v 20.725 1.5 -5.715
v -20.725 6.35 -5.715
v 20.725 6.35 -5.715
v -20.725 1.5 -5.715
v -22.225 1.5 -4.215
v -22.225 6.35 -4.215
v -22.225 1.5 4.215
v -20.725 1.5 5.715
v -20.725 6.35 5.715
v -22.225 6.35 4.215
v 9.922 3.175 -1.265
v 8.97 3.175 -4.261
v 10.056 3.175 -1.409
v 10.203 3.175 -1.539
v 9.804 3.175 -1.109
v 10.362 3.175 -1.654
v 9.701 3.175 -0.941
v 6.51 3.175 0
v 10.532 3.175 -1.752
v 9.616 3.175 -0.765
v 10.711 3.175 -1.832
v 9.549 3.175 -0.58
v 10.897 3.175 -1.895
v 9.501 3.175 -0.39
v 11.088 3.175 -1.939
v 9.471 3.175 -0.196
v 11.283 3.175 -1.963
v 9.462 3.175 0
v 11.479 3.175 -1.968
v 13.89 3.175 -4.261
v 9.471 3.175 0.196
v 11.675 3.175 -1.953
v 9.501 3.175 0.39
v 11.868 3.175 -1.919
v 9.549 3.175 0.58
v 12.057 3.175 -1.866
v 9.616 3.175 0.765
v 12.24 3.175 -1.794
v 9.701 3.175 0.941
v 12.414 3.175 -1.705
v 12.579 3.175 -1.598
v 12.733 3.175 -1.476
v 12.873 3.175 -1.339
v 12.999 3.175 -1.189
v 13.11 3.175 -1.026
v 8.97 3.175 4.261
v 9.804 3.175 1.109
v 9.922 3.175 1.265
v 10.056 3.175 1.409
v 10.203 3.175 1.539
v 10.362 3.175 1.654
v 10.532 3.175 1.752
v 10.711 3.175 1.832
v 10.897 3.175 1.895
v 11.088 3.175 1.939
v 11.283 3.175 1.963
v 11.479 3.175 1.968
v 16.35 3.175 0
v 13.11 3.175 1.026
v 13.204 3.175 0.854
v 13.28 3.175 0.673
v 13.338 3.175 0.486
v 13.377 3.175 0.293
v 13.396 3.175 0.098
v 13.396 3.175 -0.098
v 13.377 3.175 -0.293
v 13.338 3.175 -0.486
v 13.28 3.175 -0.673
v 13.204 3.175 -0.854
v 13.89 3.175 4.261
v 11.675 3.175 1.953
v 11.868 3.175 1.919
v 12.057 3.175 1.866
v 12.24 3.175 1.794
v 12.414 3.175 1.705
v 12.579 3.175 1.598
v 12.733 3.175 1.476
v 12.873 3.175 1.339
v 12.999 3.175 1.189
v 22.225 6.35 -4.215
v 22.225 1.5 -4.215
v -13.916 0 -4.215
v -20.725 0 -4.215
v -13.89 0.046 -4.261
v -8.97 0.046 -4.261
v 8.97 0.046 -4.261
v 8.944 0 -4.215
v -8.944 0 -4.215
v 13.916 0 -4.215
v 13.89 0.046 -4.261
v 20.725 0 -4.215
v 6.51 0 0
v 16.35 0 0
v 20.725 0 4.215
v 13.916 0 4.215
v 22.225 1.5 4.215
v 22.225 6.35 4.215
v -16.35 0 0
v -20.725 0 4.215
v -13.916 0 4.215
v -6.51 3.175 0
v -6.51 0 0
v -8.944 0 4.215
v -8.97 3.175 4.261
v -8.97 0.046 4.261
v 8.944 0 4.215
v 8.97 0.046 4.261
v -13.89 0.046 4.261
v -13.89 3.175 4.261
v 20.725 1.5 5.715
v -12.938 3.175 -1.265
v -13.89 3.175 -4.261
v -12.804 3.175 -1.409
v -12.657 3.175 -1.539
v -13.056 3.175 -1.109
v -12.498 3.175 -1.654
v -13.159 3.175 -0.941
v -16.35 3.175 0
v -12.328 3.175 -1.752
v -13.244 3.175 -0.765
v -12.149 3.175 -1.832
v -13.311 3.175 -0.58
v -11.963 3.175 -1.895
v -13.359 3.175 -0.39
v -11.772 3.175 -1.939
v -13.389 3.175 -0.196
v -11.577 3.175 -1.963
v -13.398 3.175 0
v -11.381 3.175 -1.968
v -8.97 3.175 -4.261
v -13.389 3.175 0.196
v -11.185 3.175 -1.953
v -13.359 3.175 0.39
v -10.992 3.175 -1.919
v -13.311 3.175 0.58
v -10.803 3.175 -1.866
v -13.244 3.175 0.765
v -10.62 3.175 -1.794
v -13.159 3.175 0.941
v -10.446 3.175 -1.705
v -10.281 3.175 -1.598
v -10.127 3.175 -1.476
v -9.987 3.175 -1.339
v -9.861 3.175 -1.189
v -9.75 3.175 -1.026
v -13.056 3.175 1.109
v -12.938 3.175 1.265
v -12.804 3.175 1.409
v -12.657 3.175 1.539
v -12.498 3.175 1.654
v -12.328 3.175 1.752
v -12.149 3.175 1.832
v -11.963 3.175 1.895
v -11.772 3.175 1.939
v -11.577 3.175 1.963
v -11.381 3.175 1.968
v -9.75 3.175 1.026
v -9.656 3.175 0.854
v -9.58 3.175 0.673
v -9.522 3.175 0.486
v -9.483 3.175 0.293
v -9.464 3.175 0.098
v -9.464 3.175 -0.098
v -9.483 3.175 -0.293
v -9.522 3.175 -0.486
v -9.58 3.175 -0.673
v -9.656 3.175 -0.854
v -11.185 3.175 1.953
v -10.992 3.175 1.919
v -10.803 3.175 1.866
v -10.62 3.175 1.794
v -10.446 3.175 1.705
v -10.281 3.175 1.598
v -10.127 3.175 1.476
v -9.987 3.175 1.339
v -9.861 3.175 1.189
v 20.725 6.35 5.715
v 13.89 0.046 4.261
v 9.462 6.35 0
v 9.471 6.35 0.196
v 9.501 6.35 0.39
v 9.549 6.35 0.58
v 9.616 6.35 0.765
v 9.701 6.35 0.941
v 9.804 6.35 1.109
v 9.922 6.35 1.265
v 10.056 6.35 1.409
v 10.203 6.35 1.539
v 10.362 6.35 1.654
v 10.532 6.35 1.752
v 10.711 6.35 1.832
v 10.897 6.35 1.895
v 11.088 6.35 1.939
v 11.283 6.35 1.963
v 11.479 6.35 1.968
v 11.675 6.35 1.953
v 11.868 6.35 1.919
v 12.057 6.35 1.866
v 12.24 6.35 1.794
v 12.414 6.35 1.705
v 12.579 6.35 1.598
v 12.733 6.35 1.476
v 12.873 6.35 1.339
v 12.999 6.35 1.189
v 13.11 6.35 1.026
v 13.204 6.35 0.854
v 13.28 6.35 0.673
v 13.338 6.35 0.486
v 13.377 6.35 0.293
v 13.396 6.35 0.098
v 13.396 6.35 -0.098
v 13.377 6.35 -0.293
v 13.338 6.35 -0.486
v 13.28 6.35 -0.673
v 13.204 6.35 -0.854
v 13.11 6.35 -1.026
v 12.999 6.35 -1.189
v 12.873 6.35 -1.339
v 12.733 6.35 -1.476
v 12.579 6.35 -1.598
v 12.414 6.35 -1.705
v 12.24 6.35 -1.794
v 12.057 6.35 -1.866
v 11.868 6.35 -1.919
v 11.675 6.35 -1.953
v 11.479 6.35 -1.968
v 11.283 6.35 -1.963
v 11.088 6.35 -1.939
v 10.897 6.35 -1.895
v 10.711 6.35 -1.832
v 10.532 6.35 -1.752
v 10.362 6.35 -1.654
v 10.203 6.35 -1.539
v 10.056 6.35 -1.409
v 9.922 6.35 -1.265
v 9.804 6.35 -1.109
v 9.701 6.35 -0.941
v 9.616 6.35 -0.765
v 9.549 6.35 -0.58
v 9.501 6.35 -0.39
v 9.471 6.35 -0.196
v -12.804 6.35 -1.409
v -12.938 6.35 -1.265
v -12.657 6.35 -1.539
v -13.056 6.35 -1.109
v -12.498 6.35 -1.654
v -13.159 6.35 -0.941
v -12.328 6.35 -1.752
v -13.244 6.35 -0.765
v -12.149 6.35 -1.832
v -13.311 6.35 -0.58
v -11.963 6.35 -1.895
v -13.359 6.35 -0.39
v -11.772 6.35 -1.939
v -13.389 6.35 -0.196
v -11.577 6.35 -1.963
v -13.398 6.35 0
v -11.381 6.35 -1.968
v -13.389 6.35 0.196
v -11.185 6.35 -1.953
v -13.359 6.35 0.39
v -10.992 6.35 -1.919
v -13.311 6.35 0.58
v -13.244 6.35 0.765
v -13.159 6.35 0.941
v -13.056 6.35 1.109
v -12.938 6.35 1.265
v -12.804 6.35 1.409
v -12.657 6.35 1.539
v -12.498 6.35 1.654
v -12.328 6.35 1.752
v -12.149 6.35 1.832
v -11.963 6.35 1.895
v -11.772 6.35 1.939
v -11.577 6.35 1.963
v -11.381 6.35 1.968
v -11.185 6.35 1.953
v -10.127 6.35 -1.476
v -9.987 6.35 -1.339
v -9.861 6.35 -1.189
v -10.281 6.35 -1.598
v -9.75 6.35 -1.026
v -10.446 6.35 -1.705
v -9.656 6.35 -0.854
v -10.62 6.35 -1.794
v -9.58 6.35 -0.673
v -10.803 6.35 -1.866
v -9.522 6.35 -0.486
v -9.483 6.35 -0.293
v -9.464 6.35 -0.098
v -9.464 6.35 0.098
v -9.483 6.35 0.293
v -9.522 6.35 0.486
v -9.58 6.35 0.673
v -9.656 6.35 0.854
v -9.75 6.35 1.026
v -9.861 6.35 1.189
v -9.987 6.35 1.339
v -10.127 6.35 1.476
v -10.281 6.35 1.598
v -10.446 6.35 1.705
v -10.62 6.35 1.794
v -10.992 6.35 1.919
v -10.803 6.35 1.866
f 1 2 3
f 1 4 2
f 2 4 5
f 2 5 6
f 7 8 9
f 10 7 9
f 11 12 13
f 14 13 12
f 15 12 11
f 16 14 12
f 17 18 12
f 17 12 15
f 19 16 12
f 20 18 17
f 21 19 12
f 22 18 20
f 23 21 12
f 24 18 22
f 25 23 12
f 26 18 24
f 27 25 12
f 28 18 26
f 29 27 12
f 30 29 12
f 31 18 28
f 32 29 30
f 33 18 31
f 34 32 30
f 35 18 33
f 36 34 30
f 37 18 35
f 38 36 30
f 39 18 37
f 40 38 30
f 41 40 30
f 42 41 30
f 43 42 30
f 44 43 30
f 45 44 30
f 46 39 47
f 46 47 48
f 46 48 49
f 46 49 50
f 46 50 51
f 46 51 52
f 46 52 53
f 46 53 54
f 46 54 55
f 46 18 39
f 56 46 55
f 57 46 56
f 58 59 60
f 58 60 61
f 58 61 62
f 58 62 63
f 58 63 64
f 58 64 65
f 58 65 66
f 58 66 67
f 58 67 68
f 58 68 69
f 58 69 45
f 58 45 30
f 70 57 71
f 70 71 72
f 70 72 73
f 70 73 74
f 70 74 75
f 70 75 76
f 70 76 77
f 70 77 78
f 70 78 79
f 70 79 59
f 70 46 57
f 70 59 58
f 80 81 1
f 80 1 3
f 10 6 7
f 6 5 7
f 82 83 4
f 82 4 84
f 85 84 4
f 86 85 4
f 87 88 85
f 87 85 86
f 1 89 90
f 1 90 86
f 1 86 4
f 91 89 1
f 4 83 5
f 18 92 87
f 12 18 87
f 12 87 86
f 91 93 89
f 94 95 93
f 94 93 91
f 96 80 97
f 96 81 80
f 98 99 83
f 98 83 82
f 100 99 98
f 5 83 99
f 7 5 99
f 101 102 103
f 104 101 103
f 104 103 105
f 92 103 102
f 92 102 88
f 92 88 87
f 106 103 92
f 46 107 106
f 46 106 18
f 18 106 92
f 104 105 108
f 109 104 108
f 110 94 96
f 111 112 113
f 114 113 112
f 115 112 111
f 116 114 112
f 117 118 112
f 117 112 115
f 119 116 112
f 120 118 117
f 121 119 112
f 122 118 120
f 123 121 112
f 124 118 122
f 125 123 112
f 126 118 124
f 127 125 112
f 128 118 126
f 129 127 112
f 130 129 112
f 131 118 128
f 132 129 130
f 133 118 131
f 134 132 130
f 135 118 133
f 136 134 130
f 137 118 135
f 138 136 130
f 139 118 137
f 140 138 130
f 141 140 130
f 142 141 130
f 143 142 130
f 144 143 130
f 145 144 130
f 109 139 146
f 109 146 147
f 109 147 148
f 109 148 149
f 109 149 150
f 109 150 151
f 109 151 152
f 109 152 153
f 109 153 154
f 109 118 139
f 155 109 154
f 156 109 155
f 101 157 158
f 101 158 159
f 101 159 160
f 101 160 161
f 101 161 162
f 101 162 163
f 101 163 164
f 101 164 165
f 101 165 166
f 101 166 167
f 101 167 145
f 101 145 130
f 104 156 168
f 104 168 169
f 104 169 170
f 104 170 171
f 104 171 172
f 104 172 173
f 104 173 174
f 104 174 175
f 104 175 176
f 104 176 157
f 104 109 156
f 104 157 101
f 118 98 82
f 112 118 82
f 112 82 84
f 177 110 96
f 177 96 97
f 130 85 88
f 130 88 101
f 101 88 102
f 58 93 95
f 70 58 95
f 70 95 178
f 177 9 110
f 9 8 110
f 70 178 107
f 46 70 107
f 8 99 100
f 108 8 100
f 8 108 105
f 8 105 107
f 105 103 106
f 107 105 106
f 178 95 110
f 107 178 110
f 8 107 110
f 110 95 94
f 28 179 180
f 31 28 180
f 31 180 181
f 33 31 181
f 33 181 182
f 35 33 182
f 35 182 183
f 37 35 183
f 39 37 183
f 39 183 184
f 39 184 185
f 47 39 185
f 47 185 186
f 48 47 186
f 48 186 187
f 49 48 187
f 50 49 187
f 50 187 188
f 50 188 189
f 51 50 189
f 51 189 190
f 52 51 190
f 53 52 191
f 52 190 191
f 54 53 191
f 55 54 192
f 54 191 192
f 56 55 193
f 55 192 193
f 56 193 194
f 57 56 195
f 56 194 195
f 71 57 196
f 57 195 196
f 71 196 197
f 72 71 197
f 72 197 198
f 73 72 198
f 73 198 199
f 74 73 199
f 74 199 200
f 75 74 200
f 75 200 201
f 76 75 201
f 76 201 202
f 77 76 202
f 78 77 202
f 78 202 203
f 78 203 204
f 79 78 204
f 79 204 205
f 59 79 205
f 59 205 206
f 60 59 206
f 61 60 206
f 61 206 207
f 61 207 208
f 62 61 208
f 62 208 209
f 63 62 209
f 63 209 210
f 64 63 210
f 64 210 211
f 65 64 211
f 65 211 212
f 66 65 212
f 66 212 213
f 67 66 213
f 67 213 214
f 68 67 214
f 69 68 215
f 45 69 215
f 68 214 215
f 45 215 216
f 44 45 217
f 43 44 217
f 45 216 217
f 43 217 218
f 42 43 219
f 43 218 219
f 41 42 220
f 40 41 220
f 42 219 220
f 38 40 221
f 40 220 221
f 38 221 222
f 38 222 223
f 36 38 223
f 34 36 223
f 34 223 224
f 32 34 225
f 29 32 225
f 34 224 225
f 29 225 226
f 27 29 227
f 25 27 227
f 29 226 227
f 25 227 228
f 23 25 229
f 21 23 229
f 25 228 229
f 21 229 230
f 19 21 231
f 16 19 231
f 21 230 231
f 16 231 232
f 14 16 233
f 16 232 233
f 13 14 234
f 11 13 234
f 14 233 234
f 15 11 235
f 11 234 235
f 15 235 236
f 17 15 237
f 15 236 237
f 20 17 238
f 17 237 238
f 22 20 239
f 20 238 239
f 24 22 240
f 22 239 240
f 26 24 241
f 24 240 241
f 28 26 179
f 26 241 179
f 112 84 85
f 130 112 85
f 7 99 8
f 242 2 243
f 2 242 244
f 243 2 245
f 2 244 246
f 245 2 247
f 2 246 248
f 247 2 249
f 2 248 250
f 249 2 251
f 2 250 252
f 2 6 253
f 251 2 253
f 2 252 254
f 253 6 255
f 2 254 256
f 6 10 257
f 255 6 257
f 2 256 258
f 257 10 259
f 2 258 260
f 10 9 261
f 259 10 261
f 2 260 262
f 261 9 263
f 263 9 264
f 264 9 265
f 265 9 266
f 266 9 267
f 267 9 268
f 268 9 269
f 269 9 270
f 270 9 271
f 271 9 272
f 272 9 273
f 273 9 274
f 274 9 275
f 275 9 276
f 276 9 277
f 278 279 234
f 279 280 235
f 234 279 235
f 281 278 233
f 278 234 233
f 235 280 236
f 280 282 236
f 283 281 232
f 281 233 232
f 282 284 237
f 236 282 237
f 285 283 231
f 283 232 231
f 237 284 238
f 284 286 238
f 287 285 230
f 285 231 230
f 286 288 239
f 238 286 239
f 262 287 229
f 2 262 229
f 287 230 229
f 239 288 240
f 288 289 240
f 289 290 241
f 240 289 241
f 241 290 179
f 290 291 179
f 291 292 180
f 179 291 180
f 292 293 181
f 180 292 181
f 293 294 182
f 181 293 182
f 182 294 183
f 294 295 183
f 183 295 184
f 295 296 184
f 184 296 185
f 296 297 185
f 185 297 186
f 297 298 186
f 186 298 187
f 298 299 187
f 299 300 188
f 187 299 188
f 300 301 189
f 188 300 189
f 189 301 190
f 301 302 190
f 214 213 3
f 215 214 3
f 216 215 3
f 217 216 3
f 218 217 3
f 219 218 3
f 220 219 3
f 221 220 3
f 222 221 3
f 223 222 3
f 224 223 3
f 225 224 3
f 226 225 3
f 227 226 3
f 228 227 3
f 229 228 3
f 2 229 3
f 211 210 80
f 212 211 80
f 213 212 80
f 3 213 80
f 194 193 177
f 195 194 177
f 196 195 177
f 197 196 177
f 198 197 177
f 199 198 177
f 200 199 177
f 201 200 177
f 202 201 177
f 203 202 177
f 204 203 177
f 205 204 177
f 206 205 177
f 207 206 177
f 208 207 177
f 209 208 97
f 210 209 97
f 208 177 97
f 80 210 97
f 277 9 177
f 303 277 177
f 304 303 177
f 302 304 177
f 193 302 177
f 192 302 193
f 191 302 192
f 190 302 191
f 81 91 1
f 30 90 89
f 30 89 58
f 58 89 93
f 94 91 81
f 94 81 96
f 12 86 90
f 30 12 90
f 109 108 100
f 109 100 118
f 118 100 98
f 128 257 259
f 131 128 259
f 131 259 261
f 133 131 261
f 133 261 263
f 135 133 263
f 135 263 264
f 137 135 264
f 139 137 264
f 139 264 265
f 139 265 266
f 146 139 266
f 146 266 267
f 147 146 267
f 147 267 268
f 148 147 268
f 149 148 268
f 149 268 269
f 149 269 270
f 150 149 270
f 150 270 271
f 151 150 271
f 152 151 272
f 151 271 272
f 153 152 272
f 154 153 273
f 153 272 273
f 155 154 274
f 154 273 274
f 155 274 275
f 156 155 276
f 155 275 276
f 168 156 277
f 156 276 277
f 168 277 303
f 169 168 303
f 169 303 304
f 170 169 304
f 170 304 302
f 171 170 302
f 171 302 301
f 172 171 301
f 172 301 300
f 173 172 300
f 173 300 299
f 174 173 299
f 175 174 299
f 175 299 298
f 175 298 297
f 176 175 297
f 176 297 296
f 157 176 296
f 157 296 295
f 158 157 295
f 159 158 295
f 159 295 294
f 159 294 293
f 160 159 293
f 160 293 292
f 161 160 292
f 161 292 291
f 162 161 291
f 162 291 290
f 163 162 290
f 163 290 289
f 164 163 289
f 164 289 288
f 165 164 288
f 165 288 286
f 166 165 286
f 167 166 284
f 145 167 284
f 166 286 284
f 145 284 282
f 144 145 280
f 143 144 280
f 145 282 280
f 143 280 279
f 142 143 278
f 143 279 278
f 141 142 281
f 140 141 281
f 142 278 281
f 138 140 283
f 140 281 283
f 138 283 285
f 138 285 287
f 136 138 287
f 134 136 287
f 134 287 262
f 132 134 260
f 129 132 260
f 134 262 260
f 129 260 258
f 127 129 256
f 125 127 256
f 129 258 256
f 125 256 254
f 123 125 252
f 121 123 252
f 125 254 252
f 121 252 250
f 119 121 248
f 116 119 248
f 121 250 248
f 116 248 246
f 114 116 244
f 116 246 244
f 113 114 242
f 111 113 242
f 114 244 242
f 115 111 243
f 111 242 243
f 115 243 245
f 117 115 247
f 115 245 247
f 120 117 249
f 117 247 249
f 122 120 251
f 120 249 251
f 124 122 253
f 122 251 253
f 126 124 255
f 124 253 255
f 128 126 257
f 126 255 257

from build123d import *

# Parameters (mm, degrees)
F0_W     = 44.45
F0_H     = 11.43
F1_DEPTH = 6.35
F3_SIZE  = 1.5
F4_DEPTH = 3.175
F5_D     = 3.937
F5_DEPTH = 6.35


with BuildPart() as f1:
    # F0 (on Front) → F1 (new body)
    with BuildSketch(Plane.XZ):
        Rectangle(F0_W, F0_H)
    extrude(amount=-F1_DEPTH)

    # F3
    f3_edges = [f1.edges().sort_by_distance(p)[0] for p in [
        (0, 0, 5.715),
        (0, 0, -5.715),
        (22.225, 0, 0),
        (-22.225, 0, 0),
        (22.225, 3.175, -5.715),
        (22.225, 3.175, 5.715),
        (-22.225, 3.175, 5.715),
        (-22.225, 3.175, -5.715),
    ]]
    chamfer(f3_edges, length=F3_SIZE)

    # F2 (on face) → F4 (cut)
    with BuildSketch(Plane.XZ):
        Polygon((-13.890003, -4.26085), (-8.969997, -4.26085), (-6.509994, 0), (-8.969997, 4.26085), (-13.890003, 4.26085), (-16.350006, 0), align=None)
        Polygon((6.509994, 0), (8.969997, -4.26085), (13.890003, -4.26085), (16.350006, 0), (13.890003, 4.26085), (8.969997, 4.26085), align=None)
    extrude(amount=-F4_DEPTH, mode=Mode.SUBTRACT)

    # F5
    with Locations(Plane.XZ):
        with Locations((-11.43, 0), (11.43, 0)):
            Hole(F5_D / 2, depth=F5_DEPTH)


solid = f1.part
